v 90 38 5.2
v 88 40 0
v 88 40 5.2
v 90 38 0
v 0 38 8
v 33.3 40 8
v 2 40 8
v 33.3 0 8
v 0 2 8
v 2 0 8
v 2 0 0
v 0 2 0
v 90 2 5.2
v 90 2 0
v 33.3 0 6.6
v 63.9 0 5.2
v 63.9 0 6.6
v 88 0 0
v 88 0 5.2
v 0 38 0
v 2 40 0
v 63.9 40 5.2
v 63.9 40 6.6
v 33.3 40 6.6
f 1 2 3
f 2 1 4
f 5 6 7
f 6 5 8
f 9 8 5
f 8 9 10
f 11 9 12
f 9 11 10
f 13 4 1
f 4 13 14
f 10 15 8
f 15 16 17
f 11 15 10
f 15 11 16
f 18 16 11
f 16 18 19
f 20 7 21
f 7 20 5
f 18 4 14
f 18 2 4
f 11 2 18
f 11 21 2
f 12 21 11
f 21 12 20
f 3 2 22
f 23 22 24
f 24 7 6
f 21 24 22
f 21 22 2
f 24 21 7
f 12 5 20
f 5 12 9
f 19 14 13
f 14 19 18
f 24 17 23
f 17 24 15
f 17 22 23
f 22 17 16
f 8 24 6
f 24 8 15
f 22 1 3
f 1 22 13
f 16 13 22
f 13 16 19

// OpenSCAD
$fn = 32;

// ----------------------------------------------------------------------
// Stepped bar: twostep, 90 x 40 x 8/5.2 mm
// ----------------------------------------------------------------------

// --- parameters (mm) ---
bar_l = 90;               // bar length, X
bar_w = 40;               // bar width, Y
plate_t = 8;              // thickness of the thick zone, Z
thin_t = 5.2;             // thickness of the thin zone
corner_c = 2;             // corner chamfer of the bar
step_cut = 2.8;           // material removed from the thin zone
stair1_x = 33.3;          // position of the first stair
stair2_x = 63.9;          // position of the second stair
mid_t = 6.6;              // thickness of the middle zone
depth_1 = 1.4;            // depth of cut 1 from the top face
depth_2 = 2.8;            // depth of cut 2 from the top face

profile = [[2, 0], [88, 0], [90, 2], [90, 38], [88, 40], [2, 40], [0, 38], [0, 2]];  // primary outline, 8 points, counter clockwise
void_1 = [[33.3, -1], [63.9, -1], [63.9, 41], [33.3, 41]];  // first stair, 4 points
void_2 = [[63.9, -1], [91, -1], [91, 41], [63.9, 41]];  // second stair, 4 points

// --- the one profile operation ---
difference() {
  linear_extrude(height = plate_t) polygon(points = profile);
  translate([0, 0, plate_t - depth_1])
    linear_extrude(height = depth_1 + 1) polygon(points = void_1);
  translate([0, 0, plate_t - depth_2])
    linear_extrude(height = depth_2 + 1) polygon(points = void_2);
}
